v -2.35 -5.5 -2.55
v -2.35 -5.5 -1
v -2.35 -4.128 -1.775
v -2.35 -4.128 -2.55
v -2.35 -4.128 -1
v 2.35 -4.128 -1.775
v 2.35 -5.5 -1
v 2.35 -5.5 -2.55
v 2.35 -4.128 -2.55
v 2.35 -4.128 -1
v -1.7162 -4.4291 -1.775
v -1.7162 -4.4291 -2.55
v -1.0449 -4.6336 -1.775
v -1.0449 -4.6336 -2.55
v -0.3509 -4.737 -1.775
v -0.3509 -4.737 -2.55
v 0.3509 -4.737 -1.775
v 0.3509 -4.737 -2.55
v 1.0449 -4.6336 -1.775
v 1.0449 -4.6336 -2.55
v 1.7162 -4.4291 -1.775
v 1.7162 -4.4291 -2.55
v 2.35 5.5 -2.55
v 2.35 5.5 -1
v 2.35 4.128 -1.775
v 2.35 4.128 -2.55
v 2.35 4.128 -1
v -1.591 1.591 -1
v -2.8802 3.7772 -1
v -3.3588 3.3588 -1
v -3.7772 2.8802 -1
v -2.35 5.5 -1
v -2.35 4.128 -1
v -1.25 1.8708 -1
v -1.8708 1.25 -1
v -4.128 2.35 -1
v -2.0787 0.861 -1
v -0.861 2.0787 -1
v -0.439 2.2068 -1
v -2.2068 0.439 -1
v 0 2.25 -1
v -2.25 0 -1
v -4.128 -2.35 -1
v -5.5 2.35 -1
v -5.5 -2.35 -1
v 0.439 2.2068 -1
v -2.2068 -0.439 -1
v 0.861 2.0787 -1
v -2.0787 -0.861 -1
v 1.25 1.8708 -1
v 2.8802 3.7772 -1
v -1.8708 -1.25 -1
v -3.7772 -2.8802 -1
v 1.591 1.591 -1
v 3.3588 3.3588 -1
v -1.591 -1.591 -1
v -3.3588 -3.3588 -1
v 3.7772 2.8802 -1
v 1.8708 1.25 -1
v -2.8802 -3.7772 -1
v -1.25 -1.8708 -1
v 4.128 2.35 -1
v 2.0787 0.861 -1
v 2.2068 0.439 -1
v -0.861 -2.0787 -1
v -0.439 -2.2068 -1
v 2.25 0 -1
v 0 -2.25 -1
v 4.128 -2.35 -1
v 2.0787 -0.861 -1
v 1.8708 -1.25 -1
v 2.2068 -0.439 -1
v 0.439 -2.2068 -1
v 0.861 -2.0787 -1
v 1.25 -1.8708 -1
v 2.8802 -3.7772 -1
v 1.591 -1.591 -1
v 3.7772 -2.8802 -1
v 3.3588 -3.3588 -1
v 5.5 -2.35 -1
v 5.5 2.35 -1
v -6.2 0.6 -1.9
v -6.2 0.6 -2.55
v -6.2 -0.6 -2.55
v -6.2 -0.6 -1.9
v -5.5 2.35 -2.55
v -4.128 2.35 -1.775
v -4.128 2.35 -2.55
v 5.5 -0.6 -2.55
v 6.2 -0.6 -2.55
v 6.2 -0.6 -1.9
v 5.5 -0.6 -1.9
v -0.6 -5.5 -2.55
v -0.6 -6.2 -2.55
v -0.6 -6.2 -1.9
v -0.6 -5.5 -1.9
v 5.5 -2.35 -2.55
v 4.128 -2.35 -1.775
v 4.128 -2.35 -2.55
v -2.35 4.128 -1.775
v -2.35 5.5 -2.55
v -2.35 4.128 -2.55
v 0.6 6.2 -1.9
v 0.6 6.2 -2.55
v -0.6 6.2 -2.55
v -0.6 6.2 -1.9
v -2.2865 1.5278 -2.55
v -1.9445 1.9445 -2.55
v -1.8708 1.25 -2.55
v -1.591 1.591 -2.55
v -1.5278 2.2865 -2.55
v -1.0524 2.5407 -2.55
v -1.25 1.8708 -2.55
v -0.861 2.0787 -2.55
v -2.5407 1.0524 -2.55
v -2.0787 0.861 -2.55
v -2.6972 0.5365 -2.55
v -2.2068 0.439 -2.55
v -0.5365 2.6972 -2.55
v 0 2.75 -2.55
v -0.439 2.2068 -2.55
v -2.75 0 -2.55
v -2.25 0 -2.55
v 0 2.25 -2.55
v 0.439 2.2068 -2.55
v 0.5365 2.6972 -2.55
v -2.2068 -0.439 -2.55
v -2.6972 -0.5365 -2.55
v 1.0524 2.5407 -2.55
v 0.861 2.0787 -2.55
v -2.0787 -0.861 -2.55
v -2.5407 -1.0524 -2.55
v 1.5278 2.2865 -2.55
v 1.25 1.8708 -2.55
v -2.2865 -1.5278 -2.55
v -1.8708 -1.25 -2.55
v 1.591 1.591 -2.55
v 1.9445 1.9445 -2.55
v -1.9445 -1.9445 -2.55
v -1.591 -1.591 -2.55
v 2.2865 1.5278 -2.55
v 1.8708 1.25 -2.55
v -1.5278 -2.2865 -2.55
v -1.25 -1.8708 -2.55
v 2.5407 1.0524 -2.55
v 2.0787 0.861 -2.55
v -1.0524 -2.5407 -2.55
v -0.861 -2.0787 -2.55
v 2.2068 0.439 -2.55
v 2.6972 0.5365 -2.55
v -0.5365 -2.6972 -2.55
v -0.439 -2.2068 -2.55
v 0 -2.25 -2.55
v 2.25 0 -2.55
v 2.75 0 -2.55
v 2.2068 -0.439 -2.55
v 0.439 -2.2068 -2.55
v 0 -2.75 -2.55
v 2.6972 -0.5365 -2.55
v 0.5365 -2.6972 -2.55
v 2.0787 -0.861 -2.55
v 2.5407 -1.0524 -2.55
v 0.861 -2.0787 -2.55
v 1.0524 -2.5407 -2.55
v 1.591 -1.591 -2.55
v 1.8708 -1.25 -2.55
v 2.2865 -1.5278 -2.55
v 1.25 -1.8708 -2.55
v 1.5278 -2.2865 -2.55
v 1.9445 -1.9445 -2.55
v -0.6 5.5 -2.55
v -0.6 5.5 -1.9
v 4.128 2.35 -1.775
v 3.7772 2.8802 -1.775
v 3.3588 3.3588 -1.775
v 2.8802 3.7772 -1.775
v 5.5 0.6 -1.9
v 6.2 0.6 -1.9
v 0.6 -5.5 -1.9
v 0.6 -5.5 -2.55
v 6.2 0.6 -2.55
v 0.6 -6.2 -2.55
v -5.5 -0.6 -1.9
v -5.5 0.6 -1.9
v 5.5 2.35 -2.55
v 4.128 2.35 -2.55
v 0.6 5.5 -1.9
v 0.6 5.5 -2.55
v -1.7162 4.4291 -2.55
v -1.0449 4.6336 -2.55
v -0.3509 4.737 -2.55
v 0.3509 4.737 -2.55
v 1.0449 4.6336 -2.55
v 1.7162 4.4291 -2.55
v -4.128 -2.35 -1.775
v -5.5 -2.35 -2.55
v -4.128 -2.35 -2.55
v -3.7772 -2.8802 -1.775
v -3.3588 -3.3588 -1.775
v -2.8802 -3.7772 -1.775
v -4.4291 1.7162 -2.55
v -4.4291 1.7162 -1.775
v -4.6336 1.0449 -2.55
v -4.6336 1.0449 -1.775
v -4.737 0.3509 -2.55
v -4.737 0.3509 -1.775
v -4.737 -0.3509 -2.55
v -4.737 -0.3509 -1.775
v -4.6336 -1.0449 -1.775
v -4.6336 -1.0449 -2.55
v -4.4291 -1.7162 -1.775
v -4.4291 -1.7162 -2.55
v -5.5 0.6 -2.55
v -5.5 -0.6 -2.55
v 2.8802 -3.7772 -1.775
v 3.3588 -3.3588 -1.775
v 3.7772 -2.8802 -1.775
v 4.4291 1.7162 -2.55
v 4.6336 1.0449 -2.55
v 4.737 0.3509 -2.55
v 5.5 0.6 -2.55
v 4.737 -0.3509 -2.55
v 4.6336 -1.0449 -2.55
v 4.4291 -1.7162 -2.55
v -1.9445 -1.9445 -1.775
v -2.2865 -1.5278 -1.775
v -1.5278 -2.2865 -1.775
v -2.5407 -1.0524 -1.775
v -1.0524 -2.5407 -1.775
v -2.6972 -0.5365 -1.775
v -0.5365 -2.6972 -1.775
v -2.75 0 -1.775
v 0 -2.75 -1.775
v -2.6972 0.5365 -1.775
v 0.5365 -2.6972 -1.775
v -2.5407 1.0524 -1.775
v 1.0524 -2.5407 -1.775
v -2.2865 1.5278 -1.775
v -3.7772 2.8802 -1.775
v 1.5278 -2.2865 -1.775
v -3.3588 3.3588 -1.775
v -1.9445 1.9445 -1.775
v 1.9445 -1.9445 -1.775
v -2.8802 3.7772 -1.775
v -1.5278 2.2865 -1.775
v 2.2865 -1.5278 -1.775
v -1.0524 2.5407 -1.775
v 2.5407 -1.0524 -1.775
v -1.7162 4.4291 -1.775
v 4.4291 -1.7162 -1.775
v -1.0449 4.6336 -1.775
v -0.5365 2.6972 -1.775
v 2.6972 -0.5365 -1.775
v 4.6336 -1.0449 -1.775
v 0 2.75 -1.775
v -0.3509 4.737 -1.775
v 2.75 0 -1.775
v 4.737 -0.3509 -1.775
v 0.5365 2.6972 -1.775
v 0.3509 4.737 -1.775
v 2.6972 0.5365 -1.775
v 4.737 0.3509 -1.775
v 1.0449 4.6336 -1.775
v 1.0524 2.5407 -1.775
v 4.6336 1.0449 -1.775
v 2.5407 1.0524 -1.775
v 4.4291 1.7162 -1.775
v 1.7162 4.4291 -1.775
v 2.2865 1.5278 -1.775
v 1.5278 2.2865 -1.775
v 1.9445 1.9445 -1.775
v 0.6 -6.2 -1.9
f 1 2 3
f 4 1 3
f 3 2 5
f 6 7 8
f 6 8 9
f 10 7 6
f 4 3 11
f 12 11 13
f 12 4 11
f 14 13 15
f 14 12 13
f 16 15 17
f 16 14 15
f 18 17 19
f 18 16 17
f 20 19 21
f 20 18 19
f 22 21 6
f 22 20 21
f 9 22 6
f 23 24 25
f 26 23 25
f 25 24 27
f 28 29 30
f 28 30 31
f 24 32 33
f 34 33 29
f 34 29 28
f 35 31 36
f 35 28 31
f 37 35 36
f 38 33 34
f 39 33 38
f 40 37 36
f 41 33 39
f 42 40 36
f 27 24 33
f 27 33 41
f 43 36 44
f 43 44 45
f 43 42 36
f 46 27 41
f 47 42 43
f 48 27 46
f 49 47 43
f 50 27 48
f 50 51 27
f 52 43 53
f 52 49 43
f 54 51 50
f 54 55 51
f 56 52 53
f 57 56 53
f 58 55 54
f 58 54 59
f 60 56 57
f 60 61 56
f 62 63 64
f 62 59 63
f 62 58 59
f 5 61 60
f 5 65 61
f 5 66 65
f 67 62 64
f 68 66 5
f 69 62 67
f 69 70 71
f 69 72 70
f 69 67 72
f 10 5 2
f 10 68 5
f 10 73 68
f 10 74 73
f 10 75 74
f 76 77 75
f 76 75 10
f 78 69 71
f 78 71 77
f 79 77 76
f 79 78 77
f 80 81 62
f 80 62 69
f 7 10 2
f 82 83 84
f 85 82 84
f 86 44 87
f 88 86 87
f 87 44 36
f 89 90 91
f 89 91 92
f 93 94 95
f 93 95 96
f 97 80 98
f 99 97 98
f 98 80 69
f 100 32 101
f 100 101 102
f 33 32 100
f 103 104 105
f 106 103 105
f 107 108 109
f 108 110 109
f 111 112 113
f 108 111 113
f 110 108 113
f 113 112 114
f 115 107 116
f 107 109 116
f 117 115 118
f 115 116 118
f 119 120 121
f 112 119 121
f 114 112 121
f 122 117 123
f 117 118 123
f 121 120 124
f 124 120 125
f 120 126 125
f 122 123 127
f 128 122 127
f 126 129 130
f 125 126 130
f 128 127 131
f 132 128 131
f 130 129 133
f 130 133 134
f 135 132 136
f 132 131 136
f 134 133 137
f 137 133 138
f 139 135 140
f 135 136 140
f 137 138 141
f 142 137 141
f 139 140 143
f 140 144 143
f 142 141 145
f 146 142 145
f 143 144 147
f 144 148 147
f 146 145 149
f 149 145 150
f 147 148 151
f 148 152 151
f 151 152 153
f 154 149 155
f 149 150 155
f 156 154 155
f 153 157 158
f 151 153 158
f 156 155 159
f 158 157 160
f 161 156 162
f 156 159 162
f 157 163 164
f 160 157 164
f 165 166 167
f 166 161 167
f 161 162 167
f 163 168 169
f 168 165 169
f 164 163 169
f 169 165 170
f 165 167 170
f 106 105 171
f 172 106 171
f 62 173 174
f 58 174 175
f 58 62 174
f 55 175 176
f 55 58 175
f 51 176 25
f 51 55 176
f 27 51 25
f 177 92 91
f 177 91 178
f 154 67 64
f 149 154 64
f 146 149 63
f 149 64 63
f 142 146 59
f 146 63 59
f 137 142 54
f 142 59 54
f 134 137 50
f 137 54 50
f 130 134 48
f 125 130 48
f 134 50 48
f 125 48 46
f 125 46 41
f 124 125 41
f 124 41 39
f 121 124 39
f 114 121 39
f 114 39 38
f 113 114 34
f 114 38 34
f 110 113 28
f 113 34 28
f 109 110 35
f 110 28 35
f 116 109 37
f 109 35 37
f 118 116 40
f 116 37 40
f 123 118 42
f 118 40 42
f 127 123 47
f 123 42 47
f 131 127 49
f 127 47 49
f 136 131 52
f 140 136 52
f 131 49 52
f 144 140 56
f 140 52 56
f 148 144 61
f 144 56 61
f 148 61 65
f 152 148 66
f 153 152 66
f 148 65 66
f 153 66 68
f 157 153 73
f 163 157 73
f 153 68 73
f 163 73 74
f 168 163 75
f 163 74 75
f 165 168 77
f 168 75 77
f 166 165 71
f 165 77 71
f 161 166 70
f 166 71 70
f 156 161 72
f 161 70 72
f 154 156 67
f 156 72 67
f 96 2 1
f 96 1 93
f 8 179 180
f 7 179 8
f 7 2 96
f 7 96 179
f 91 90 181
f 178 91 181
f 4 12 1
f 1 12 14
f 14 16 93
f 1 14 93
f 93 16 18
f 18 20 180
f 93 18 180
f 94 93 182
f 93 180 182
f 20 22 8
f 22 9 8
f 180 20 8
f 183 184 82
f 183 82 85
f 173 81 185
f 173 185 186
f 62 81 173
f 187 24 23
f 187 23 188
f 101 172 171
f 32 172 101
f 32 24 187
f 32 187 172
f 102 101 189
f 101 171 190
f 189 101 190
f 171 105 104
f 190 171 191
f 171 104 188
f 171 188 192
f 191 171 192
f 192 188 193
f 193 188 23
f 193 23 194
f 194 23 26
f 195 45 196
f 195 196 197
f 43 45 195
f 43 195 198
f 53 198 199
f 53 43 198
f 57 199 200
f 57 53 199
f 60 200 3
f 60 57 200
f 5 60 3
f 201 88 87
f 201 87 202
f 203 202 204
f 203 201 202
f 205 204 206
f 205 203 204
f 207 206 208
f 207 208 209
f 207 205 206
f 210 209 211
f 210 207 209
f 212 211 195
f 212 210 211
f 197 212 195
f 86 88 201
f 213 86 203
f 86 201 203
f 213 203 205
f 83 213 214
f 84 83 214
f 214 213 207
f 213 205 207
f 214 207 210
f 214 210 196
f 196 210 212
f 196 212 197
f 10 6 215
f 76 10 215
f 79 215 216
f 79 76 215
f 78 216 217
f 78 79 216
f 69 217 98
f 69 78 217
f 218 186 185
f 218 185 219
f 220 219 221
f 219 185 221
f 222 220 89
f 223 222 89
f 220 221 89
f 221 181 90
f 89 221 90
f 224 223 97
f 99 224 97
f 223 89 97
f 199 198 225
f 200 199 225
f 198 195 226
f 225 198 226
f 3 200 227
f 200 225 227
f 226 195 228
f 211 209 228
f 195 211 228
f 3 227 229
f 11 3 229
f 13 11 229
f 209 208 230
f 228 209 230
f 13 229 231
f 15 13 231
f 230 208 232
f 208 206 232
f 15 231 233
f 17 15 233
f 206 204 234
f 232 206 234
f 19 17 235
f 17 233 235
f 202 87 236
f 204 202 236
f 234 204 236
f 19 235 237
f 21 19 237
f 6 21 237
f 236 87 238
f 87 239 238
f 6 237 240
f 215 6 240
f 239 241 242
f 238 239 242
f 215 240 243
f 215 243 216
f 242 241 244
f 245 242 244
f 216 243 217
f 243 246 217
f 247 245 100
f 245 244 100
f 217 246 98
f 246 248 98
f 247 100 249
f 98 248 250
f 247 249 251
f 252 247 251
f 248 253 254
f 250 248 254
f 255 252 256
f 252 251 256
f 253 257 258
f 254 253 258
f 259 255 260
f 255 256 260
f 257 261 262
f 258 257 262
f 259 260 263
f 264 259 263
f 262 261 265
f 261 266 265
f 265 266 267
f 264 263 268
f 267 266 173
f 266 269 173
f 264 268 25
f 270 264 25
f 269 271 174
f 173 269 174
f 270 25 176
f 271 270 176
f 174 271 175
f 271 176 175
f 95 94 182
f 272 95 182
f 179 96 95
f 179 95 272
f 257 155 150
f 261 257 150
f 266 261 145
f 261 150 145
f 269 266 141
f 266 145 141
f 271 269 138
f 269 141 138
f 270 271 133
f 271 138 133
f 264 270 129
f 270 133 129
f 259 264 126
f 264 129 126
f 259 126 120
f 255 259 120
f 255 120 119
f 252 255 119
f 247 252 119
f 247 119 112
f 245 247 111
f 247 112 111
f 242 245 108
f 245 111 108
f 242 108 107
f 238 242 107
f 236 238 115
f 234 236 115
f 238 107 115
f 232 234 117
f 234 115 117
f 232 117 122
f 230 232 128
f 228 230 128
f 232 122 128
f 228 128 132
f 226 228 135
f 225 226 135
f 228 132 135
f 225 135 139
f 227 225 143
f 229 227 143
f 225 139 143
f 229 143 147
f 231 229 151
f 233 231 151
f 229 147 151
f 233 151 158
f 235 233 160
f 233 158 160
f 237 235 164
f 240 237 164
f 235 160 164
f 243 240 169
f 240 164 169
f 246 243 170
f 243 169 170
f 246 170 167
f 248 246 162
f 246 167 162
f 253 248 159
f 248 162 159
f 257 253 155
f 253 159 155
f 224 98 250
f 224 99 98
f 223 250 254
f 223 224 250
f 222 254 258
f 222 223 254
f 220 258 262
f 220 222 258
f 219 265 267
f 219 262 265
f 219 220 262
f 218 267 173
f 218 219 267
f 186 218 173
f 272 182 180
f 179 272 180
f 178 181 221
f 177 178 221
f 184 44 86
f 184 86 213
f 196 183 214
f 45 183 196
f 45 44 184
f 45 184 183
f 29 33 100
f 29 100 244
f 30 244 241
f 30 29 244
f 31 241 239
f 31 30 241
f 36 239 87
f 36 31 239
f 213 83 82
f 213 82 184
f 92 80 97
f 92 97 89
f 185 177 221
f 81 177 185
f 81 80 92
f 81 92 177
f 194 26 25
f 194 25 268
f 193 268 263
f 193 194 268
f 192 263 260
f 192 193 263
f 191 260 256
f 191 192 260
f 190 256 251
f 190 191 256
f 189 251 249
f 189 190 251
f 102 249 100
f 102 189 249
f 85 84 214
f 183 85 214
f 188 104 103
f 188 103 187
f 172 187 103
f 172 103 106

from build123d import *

# Parameters (mm, degrees)
SKETCH022_R           = 4.75
SKETCH022_R_2         = 2.25
PAD011_DEPTH          = 1.55
SKETCH023_W           = 4.7
SKETCH023_H           = 2
PAD012_DEPTH          = 1.55
SKETCH025_W           = 1.2
SKETCH025_H           = 0.7
PAD013_DEPTH          = 0.65
POLARPATTERN003_COUNT = 4
SKETCH024_R           = 4.75
SKETCH024_R_2         = 2.75
POCKET009_DEPTH       = 0.775


with BuildPart() as part:
    # Sketch022 → Pad011 (new body)
    with BuildSketch(Plane.XY):
        Circle(SKETCH022_R)
        Circle(SKETCH022_R_2, mode=Mode.SUBTRACT)
    extrude(amount=-PAD011_DEPTH)

    # Sketch023 → Pad012 (join)
    with BuildSketch(Plane.XY):
        with Locations((0, -4.5)):
            Rectangle(SKETCH023_W, SKETCH023_H)
    pad012 = extrude(amount=-PAD012_DEPTH)

    # Sketch025 → Pad013 (join)
    with BuildSketch(Plane.XY.offset(-1.55)):
        with Locations((0, -5.85)):
            Rectangle(SKETCH025_W, SKETCH025_H)
    pad013 = extrude(amount=PAD013_DEPTH)

    # PolarPattern003: Pad012, Pad013 ×4 about axis
    polarpattern003_axis = Axis((0, 0, 0), (0, 0, 1))
    for i in range(1, POLARPATTERN003_COUNT):
        add(pad012.rotate(polarpattern003_axis, i * 360 / POLARPATTERN003_COUNT))
        add(pad013.rotate(polarpattern003_axis, i * 360 / POLARPATTERN003_COUNT))

    # Sketch024 → Pocket009 (cut)
    with BuildSketch(Plane.XY.offset(-1.55)):
        Circle(SKETCH024_R)
        Circle(SKETCH024_R_2, mode=Mode.SUBTRACT)
    extrude(amount=POCKET009_DEPTH, mode=Mode.SUBTRACT)


with BuildPart() as part_1:
    # Body002 placement: moved
    add(part.part.moved(Location((0, 0, -1))))


solid = part_1.part
